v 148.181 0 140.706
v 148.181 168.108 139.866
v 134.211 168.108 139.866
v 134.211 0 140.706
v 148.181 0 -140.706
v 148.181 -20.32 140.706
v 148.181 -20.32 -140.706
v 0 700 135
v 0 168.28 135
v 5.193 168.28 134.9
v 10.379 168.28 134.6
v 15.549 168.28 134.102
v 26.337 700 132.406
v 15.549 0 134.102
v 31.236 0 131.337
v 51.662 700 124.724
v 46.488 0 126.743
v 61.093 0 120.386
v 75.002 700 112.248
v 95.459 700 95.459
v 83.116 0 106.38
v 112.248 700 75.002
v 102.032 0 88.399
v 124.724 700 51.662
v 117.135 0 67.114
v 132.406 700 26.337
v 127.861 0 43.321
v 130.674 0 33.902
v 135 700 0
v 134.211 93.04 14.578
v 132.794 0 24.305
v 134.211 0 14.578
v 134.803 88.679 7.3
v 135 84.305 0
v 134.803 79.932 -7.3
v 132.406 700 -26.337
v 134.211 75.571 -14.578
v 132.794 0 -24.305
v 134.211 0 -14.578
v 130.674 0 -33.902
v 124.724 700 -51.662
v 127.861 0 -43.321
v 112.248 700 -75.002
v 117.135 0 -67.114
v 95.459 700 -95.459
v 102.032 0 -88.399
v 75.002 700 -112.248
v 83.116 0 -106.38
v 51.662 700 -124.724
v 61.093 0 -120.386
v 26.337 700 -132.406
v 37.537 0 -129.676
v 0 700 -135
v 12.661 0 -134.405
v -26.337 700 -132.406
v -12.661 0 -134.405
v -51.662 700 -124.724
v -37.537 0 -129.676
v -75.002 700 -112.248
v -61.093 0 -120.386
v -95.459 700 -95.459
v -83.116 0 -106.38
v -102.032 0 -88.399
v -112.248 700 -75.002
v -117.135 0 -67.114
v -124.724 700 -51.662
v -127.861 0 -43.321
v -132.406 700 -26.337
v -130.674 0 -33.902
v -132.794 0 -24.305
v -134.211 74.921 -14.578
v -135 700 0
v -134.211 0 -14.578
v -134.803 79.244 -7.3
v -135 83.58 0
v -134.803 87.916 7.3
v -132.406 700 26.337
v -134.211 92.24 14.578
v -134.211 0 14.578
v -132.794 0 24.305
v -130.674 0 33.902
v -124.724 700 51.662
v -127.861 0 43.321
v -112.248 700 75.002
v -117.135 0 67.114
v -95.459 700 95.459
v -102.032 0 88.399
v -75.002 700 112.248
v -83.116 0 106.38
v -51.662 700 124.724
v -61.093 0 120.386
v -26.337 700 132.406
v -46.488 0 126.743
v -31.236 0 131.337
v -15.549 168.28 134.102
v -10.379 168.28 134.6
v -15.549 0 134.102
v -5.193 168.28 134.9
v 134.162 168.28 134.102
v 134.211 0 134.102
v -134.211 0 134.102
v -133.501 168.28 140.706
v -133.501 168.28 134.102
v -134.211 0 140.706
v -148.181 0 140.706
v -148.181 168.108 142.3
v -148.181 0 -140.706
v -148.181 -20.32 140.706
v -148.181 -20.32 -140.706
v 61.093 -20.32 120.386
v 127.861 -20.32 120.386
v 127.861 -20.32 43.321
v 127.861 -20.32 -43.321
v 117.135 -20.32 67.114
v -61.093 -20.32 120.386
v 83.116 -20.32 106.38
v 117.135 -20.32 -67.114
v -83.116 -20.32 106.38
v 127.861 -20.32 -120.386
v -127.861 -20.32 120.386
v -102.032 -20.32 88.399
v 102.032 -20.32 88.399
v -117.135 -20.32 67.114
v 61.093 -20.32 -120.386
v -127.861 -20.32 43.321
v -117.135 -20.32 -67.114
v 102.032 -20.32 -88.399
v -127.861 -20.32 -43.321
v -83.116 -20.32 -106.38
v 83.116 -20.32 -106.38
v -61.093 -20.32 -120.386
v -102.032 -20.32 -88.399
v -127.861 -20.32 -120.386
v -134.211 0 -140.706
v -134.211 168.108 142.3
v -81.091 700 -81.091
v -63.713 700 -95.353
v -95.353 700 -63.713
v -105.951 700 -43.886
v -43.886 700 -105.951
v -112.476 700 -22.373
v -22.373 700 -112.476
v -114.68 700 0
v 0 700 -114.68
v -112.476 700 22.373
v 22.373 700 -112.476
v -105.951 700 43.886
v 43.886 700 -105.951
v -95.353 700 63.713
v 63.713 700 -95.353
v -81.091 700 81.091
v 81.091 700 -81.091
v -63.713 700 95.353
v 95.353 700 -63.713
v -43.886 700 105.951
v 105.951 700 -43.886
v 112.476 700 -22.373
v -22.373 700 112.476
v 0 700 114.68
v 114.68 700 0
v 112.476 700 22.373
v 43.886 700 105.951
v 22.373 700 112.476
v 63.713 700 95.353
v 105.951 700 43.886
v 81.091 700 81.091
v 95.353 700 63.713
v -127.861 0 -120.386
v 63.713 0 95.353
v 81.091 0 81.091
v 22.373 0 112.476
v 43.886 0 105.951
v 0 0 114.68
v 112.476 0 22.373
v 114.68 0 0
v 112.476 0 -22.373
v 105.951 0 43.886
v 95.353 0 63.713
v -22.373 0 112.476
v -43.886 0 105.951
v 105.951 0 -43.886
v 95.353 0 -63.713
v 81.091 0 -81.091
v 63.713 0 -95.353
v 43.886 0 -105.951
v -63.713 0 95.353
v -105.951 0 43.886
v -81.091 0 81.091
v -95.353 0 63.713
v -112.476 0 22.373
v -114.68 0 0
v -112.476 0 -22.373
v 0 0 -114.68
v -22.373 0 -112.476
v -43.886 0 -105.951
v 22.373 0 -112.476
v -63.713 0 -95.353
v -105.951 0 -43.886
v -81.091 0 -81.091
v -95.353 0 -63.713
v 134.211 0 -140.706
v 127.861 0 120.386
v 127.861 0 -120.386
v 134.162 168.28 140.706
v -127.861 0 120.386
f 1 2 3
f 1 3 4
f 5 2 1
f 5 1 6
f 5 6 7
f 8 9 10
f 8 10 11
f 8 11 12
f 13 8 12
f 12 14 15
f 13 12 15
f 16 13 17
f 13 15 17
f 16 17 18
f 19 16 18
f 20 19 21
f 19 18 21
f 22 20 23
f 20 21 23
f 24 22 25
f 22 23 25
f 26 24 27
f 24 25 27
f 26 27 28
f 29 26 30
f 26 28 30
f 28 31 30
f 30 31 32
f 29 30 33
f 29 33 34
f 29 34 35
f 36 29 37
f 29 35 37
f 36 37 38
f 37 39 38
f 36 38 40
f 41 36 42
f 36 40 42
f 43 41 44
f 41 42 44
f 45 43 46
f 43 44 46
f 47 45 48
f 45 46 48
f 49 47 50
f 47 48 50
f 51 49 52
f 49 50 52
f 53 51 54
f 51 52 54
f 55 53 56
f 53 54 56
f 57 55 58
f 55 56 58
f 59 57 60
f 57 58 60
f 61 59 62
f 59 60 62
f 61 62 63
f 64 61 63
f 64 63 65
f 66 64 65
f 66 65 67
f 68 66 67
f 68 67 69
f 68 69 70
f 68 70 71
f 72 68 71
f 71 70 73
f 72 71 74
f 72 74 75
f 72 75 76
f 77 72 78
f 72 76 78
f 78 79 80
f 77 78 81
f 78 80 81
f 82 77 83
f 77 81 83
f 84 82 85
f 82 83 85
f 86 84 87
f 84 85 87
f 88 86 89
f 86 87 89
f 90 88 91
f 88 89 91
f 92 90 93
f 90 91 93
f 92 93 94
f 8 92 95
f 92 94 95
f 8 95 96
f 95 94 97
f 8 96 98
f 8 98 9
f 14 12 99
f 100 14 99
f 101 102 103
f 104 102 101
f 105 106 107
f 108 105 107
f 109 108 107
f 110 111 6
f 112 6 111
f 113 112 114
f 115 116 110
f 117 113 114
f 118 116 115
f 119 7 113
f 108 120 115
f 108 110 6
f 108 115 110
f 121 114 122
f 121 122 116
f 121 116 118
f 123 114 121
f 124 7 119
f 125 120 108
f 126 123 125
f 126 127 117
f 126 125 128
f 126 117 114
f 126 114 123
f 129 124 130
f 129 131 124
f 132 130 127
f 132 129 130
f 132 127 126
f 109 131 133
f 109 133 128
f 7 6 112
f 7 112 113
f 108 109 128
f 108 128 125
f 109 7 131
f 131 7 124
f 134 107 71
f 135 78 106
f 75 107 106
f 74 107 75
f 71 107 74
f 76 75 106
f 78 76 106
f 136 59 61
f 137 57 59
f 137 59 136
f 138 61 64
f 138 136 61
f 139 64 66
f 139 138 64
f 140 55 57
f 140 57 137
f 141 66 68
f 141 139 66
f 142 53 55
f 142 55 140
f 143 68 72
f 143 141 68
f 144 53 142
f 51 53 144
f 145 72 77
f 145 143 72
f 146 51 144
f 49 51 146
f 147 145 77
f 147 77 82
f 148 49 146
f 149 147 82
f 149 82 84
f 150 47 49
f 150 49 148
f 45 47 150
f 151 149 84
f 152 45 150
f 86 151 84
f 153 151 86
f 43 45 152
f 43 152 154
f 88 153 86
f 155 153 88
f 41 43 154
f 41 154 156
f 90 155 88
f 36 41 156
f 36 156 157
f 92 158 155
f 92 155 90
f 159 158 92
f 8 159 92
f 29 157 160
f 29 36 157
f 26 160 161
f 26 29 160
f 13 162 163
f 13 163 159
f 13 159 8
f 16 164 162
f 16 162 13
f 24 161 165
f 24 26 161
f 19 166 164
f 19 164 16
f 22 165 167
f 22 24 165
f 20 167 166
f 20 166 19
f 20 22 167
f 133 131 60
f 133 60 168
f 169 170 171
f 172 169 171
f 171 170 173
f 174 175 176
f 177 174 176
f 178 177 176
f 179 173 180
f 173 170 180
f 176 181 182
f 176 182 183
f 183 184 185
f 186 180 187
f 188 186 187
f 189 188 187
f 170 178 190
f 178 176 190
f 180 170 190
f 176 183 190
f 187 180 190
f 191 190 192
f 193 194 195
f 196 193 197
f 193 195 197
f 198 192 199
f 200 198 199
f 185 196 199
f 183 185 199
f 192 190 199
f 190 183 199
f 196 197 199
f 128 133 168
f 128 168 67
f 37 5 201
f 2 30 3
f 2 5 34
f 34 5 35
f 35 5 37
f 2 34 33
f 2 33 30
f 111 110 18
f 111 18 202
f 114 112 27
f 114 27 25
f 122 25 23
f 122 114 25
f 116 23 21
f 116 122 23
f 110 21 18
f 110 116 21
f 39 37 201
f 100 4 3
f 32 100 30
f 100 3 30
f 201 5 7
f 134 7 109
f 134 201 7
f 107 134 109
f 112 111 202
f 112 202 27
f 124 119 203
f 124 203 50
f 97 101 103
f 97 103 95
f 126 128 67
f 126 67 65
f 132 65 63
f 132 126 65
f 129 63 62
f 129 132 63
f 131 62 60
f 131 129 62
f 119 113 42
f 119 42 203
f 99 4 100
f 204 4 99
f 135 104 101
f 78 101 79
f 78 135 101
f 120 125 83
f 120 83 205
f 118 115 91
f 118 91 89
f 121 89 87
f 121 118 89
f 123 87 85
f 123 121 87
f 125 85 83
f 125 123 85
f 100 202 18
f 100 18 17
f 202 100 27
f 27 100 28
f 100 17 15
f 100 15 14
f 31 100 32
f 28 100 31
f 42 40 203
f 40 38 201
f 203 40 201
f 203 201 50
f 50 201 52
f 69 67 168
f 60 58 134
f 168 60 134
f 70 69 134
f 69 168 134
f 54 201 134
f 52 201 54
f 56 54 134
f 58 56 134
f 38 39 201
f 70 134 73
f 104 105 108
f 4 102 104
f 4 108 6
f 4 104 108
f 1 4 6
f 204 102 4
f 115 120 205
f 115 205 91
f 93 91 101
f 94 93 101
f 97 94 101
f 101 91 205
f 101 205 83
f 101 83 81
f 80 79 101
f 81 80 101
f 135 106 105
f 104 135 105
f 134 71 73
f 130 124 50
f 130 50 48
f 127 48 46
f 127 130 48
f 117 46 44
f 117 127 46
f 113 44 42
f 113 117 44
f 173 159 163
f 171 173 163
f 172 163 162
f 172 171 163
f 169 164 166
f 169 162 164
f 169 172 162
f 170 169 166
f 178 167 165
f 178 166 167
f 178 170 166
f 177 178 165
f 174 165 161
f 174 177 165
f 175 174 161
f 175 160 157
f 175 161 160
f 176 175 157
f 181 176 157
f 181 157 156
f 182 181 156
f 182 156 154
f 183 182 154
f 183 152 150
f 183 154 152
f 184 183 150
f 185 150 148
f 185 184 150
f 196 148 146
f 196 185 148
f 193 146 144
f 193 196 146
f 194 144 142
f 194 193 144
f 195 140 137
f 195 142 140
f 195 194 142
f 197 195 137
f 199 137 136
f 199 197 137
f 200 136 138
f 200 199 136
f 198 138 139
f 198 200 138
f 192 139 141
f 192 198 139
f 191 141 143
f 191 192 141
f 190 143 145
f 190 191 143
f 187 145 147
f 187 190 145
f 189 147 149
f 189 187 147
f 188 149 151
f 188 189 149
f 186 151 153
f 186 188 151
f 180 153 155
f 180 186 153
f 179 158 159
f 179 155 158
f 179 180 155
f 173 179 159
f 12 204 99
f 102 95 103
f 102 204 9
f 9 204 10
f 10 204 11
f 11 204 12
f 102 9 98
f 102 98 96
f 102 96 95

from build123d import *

# Parameters (mm, degrees)
SKETCH1_R           = 135
BOSS_EXTRUDE1_DEPTH = 700
SKETCH2_W           = 296.361167152
SKETCH2_H           = 281.411070578
BOSS_EXTRUDE2_DEPTH = 20.32
SHELL1_T            = -20.32
SHELL2_START        = -20.32
SHELL2_DEPTH        = 20.32
BOSS_EXTRUDE3_DEPTH = 13.97
BOSS_EXTRUDE4_DEPTH = 13.97
BOSS_EXTRUDE5_DEPTH = 6.604


# Read off the part's stored shape, not the designer's step: Shell2
with BuildPart() as part:
    # Sketch1 → Boss-Extrude1 (new body)
    with BuildSketch(Plane(origin=(0, 0, 0), x_dir=(1, 0, 0), z_dir=(0, 1, 0))):
        with Locations(Location((0, 0, 0), (0, 0, 270))):
            Circle(SKETCH1_R)
    extrude(amount=BOSS_EXTRUDE1_DEPTH)

    # Sketch2 → Boss-Extrude2 (add)
    with BuildSketch(Plane(origin=(0, 0, 0), x_dir=(-1, 0, 0), z_dir=(0, -1, 0))):
        Rectangle(SKETCH2_W, SKETCH2_H)
    extrude(amount=BOSS_EXTRUDE2_DEPTH)

    # Shell1
    shell1_openings = [part.faces().sort_by_distance(p)[0] for p in [
        (0, 700, 0),
    ]]
    offset(amount=SHELL1_T, openings=shell1_openings, kind=Kind.INTERSECTION)

    # Shell2 outline → Shell2 (cut)
    with BuildSketch(Plane(origin=(0, 0, 0), x_dir=(1, 0, 0), z_dir=(0, 1, 0)).offset(SHELL2_START)):
        with BuildLine():
            Line((-127.860583576, -43.320562873), (-127.860583576, -120.385535289))
            Line((-127.860583576, -120.385535289), (-61.092740103, -120.385535289))
            ThreePointArc((-61.092740103, -120.385535289), (-102.032309224, -88.399139557), (-127.860583576, -43.320562873))
        make_face()
        with BuildLine():
            Line((-127.860583576, 120.385535289), (-127.860583576, 43.320562873))
            ThreePointArc((-127.860583576, 43.320562873), (-102.032309224, 88.399139557), (-61.092740103, 120.385535289))
            Line((-61.092740103, 120.385535289), (-127.860583576, 120.385535289))
        make_face()
        with BuildLine():
            ThreePointArc((127.860583576, -43.320562873), (102.032309224, -88.399139557), (61.092740103, -120.385535289))
            Line((61.092740103, -120.385535289), (127.860583576, -120.385535289))
            Line((127.860583576, -120.385535289), (127.860583576, -43.320562873))
        make_face()
        with BuildLine():
            Line((127.860583576, 120.385535289), (61.092740103, 120.385535289))
            ThreePointArc((61.092740103, 120.385535289), (102.032309224, 88.399139557), (127.860583576, 43.320562873))
            Line((127.860583576, 43.320562873), (127.860583576, 120.385535289))
        make_face()
    extrude(amount=SHELL2_DEPTH, mode=Mode.SUBTRACT)

    # Sketch3 → Boss-Extrude3 (add)
    with BuildSketch(Plane.ZY.offset(148.180583576)):
        Polygon((-140.705535289, 0), (142.300478433, 168.1079442), (140.705535289, 0), align=None)
    extrude(amount=-BOSS_EXTRUDE3_DEPTH)

    # Sketch4 → Boss-Extrude4 (add)
    with BuildSketch(Plane(origin=(148.180583576, 0, 0), x_dir=(0, 0, -1), z_dir=(1, 0, 0))):
        Polygon((140.705535289, 0), (-139.866409205, 168.107944167), (-140.705535289, 0), align=None)
    extrude(amount=-BOSS_EXTRUDE4_DEPTH)

    # Sketch6 → Boss-Extrude5 (add)
    with BuildSketch(Plane.XY.offset(140.705535289)):
        Polygon((134.162146303, 168.27987687), (-133.500855759, 168.27987687), (-134.210583576, 0), (134.210583576, 0), align=None)
    extrude(amount=-BOSS_EXTRUDE5_DEPTH)


solid = part.part
